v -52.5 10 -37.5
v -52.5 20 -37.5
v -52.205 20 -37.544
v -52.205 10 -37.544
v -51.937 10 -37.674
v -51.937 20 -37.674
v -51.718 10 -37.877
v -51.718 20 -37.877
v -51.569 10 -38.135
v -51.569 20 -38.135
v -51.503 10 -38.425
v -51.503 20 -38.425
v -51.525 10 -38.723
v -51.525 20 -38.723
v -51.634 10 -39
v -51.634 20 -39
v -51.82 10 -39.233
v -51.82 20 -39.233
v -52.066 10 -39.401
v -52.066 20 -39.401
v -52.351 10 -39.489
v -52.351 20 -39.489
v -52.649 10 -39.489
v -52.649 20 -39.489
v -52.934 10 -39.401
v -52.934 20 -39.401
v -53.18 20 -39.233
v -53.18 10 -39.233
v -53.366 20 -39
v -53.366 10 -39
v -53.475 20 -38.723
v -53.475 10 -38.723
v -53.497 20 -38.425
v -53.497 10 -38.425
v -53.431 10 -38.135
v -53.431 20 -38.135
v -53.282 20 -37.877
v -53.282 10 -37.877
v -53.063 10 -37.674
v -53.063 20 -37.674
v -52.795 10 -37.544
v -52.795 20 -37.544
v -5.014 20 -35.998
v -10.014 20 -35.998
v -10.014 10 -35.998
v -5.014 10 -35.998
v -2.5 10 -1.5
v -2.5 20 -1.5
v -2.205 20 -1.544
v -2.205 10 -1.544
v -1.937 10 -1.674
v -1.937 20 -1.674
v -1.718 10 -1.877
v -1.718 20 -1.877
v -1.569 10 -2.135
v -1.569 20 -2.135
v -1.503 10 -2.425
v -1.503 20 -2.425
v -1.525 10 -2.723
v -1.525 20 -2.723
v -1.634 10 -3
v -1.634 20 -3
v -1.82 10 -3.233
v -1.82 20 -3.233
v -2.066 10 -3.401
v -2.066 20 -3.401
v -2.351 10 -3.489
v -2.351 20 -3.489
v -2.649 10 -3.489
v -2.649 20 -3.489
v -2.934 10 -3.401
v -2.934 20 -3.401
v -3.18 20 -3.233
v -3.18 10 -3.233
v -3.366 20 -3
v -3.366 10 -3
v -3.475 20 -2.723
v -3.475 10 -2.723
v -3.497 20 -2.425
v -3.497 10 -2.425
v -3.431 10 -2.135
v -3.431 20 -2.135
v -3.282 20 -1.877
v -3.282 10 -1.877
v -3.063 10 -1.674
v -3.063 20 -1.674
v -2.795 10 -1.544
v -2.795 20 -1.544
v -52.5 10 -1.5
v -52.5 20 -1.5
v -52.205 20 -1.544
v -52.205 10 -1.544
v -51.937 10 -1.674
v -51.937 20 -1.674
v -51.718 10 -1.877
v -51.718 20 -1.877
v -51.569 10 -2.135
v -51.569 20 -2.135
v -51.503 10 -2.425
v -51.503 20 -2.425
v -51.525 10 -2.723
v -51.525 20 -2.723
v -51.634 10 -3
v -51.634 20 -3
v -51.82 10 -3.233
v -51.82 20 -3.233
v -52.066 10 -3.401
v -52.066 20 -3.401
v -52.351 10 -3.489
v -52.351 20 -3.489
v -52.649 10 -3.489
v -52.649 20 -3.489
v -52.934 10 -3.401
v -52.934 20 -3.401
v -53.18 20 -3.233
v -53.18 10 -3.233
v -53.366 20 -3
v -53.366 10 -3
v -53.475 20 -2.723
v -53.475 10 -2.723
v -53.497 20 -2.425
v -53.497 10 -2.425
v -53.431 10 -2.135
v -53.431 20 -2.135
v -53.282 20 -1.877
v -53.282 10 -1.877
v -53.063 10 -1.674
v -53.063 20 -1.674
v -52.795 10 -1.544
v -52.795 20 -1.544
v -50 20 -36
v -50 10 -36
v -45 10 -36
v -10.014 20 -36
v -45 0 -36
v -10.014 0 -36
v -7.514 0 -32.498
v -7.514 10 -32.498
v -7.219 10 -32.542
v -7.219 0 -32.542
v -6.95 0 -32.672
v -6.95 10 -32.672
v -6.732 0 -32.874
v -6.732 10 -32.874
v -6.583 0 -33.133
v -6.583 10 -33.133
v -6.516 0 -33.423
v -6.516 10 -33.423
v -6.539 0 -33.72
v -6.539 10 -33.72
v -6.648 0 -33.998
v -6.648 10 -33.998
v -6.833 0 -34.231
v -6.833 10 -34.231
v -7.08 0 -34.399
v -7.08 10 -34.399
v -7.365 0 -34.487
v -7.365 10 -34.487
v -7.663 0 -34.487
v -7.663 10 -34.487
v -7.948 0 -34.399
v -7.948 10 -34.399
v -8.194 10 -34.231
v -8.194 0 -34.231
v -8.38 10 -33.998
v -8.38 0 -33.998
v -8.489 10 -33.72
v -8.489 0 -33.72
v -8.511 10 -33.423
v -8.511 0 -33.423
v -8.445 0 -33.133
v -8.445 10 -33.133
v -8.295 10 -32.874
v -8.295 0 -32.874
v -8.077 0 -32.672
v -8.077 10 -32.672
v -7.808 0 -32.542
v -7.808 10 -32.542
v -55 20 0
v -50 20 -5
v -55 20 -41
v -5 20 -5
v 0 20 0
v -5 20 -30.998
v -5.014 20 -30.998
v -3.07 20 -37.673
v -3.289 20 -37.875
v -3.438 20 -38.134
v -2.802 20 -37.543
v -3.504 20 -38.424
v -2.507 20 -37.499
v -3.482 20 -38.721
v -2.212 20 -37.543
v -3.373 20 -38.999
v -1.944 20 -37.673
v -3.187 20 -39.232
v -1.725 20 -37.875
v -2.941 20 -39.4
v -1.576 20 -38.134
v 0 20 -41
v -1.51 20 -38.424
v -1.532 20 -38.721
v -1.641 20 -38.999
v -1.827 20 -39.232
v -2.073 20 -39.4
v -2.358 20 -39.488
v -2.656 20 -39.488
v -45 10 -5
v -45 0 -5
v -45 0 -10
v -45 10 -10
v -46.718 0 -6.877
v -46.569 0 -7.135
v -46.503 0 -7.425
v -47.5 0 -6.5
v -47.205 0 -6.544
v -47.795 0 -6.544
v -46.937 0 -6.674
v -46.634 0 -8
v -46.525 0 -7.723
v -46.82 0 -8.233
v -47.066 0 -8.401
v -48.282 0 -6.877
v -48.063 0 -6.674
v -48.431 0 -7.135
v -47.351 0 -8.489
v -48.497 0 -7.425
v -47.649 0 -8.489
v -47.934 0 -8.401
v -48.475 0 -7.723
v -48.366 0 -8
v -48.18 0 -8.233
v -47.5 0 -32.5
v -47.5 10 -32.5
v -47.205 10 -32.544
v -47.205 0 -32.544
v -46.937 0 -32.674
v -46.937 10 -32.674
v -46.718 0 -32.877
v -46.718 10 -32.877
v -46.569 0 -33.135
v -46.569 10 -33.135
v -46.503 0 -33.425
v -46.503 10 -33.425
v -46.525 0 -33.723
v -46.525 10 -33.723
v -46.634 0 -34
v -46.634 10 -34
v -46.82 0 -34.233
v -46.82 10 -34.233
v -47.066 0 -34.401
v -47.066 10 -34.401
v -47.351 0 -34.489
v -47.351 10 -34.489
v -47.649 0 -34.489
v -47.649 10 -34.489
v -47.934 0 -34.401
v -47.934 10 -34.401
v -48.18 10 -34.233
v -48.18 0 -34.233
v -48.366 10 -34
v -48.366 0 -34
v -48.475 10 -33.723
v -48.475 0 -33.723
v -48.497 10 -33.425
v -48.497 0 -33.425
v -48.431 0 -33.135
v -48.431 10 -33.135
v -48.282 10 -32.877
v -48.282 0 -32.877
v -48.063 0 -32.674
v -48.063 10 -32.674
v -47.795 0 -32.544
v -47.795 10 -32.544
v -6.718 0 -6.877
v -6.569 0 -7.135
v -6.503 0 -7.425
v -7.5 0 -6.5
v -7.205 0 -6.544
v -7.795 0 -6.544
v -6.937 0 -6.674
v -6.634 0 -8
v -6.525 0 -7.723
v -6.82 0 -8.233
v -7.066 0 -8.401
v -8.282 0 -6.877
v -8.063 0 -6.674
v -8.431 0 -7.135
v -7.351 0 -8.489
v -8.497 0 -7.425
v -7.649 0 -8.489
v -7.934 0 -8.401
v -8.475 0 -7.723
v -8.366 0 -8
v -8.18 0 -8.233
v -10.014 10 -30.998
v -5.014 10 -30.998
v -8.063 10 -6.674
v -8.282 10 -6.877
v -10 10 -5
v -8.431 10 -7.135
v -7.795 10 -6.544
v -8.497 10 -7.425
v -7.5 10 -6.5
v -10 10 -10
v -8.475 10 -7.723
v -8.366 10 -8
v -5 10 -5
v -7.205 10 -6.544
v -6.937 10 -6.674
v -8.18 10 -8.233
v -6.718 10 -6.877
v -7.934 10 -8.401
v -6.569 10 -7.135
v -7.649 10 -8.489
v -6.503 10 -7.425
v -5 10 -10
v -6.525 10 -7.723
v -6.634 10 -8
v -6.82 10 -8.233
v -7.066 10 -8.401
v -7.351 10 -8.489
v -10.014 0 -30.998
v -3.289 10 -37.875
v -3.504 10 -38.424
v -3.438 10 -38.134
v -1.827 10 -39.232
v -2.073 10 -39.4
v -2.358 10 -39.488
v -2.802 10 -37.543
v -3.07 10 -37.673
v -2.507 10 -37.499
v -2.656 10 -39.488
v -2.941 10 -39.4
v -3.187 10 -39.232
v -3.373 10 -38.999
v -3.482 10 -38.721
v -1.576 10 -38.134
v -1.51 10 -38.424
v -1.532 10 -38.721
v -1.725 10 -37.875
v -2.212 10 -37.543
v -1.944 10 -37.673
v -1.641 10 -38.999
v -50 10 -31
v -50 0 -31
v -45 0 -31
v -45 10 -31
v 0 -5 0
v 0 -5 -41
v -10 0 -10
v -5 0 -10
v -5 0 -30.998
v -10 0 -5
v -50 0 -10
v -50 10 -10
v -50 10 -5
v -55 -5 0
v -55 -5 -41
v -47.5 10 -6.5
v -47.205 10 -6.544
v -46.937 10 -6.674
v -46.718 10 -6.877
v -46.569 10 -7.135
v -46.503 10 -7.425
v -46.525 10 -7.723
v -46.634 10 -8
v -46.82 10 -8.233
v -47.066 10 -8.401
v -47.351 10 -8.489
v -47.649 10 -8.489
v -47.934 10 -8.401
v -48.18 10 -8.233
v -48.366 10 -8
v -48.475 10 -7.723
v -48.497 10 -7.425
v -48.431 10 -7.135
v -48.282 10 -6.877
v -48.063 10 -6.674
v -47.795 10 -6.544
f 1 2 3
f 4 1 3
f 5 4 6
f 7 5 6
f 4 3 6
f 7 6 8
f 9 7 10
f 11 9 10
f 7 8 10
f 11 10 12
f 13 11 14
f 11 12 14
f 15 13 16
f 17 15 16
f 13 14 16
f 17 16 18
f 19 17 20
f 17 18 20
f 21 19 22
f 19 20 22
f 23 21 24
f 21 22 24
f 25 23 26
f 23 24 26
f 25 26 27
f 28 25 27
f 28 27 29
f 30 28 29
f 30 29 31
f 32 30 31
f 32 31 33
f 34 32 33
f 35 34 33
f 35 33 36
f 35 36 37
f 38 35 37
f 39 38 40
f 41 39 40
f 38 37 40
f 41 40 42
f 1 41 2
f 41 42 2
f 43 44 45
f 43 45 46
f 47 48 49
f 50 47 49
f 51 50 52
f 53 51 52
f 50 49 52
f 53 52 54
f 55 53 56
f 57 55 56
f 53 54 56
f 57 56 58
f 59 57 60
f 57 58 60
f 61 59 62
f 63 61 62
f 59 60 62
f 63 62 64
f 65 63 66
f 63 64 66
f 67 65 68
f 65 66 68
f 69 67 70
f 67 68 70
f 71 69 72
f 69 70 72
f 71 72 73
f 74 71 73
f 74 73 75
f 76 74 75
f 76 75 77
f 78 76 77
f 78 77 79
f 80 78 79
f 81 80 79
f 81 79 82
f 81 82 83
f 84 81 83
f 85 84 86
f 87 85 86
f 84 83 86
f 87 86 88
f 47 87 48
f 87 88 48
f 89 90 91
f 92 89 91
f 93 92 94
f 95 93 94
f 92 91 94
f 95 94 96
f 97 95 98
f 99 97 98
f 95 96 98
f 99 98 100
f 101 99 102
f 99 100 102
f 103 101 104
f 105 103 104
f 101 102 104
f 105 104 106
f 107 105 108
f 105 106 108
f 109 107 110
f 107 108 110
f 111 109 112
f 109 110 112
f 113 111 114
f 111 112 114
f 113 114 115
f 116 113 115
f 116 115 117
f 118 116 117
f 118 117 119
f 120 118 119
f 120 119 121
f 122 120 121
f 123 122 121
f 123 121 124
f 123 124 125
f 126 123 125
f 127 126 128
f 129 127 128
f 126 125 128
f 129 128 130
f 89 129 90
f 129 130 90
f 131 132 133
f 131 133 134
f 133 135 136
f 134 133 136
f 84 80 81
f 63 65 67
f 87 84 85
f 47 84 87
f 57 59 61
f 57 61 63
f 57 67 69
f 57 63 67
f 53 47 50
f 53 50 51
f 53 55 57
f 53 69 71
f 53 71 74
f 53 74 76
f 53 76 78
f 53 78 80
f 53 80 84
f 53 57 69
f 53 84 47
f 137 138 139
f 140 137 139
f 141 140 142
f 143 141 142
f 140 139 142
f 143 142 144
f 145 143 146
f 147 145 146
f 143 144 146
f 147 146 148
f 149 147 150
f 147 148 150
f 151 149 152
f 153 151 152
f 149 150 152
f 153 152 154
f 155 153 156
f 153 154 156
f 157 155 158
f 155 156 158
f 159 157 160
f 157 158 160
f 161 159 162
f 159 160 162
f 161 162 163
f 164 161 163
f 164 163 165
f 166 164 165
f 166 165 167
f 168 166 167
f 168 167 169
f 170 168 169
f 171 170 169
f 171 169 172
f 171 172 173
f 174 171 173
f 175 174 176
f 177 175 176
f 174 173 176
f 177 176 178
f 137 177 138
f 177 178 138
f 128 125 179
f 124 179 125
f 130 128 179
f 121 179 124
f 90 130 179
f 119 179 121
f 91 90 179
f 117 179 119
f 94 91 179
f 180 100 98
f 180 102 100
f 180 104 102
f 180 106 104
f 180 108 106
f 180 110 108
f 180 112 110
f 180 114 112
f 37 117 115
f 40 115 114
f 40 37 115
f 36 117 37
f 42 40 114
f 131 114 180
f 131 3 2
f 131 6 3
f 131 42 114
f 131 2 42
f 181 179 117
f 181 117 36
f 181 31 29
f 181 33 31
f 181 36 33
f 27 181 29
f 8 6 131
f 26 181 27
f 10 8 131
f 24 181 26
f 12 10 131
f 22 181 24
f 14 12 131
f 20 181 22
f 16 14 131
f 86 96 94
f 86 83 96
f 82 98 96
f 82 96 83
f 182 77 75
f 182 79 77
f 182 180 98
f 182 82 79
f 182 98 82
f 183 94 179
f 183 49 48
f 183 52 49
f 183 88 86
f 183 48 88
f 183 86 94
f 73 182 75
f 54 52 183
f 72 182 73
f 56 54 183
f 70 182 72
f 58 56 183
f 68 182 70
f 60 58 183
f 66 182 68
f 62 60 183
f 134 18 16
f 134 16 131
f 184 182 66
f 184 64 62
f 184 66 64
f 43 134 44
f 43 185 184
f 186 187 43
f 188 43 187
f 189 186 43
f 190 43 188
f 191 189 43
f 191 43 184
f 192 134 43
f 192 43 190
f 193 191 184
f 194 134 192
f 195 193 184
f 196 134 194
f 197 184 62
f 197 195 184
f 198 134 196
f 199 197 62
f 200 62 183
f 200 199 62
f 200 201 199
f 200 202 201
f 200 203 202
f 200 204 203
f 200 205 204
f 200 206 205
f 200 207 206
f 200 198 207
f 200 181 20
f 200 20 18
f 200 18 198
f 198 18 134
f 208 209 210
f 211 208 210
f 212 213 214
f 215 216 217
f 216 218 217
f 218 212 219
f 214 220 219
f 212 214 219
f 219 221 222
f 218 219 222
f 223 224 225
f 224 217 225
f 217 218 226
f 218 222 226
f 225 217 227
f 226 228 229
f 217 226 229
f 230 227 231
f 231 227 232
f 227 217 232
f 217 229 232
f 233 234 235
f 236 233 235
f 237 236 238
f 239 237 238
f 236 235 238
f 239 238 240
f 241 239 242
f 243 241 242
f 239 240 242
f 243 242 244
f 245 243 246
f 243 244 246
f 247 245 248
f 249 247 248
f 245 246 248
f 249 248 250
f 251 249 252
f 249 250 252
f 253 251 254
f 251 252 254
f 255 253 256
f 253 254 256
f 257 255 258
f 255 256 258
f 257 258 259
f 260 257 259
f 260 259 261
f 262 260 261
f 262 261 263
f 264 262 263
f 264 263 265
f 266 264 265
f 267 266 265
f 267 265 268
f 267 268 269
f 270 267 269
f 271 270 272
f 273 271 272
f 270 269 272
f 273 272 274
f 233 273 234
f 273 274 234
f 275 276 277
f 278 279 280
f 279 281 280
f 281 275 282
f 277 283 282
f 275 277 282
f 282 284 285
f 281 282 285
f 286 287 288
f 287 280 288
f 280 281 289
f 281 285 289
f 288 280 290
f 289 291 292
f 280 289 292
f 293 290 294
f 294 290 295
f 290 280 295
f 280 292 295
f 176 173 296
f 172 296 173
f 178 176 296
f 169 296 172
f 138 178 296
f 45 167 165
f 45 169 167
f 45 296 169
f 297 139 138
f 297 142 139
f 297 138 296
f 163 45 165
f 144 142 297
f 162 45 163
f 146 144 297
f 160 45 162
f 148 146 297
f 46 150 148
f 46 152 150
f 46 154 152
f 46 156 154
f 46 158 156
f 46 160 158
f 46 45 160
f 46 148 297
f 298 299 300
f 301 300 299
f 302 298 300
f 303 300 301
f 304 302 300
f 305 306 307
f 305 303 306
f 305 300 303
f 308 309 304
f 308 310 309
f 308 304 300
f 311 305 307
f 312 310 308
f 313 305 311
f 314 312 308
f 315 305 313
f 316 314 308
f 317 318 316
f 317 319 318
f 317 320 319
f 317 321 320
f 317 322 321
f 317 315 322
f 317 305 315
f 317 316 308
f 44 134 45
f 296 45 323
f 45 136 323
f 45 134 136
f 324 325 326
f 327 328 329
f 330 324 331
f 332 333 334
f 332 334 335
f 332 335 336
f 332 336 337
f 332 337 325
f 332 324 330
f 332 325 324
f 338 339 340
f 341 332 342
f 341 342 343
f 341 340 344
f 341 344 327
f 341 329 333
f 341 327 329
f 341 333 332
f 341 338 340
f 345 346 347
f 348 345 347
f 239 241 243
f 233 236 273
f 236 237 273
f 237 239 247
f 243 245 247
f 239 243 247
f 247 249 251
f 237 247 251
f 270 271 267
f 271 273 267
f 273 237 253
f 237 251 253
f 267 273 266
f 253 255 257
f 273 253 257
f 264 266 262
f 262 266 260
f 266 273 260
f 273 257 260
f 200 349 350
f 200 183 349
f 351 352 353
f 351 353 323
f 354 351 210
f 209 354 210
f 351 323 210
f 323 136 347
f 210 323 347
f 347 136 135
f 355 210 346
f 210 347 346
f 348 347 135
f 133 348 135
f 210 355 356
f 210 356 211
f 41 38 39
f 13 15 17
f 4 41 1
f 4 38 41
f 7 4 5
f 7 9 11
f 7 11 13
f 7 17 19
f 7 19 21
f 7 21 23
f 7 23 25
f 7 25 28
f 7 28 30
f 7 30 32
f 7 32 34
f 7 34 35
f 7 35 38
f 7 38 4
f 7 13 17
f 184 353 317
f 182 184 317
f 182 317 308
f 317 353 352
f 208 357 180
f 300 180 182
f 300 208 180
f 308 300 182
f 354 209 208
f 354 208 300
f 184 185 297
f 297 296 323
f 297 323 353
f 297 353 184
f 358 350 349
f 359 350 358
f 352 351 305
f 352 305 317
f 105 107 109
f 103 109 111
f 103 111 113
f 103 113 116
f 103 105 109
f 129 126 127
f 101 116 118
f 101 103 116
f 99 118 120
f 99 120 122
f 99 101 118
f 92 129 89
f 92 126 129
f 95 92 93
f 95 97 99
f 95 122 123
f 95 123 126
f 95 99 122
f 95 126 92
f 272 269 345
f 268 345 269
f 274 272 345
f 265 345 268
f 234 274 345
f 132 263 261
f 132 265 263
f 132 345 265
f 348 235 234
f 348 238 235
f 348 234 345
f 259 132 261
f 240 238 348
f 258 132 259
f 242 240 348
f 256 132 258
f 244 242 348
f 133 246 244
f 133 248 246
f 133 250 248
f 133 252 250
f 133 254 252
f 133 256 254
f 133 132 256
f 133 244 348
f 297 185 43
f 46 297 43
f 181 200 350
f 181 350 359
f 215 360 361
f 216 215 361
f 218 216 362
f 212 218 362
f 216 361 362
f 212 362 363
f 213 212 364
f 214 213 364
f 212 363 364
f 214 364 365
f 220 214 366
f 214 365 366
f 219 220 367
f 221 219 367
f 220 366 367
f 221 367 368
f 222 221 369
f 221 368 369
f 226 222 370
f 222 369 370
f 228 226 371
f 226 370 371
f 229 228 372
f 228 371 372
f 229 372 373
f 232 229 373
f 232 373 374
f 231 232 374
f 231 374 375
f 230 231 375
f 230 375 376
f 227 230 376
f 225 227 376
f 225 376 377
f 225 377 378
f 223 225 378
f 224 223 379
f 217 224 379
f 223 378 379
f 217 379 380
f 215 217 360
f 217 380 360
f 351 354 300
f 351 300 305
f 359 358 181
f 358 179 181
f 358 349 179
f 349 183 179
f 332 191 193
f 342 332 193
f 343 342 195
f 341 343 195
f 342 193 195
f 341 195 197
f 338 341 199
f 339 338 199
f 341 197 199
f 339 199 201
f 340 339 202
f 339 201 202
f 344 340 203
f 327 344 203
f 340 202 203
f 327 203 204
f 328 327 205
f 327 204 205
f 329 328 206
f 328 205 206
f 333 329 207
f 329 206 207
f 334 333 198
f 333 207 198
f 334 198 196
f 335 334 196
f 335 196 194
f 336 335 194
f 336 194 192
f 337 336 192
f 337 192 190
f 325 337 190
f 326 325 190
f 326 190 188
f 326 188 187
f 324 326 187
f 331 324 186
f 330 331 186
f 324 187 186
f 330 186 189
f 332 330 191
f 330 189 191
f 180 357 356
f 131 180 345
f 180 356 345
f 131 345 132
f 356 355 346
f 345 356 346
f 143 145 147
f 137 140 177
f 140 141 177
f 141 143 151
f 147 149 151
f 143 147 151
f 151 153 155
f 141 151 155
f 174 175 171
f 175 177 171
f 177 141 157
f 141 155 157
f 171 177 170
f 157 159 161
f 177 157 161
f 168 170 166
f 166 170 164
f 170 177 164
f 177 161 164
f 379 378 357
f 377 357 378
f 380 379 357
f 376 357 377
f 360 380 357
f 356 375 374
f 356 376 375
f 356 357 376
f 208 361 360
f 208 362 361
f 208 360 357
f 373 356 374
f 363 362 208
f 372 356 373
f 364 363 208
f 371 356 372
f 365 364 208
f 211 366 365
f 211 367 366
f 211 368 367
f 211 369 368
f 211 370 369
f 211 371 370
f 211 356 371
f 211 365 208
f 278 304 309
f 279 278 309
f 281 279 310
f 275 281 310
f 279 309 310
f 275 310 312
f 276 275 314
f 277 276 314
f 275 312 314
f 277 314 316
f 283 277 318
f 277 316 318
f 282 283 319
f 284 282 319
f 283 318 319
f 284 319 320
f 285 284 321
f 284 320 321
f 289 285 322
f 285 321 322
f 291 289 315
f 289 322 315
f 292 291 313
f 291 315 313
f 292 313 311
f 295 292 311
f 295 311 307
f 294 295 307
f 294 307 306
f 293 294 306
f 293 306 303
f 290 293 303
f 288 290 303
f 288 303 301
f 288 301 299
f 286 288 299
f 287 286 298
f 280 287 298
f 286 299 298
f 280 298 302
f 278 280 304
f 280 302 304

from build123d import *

# Parameters (mm, degrees)
SKETCH2_W            = 55
SKETCH2_H            = 5
SKETCH2_W_2          = 5
BOSS_EXTRUDE3_DEPTH  = 20
SKETCH3_W            = 5
SKETCH3_H            = 5
CUT_EXTRUDE1_DEPTH   = 10
SKETCH5_W            = 5
SKETCH5_H            = 5
CUT_EXTRUDE2_DEPTH   = 10
SKETCH6_W            = 5
SKETCH6_H            = 5
CUT_EXTRUDE3_DEPTH   = 10
SKETCH7_R            = 1
CUT_EXTRUDE5_DEPTH   = 10
SKETCH8_R            = 1
CUT_EXTRUDE6_DEPTH   = 10
SKETCH9_R            = 1
CUT_EXTRUDE7_DEPTH   = 10
SKETCH10_R           = 1
CUT_EXTRUDE8_DEPTH   = 10
SKETCH11_W           = 55
SKETCH11_H           = 41
BOSS_EXTRUDE10_DEPTH = 5
SKETCH12_R           = 1
CUT_EXTRUDE9_DEPTH   = 10
SKETCH13_R           = 1
CUT_EXTRUDE10_DEPTH  = 10
SKETCH14_R           = 1
CUT_EXTRUDE11_DEPTH  = 10
SKETCH15_R           = 1
CUT_EXTRUDE12_DEPTH  = 10


with BuildPart() as part:
    # Sketch2 → Boss-Extrude3 (new body)
    with BuildSketch(Plane(origin=(0, 0, 0), x_dir=(1, 0, 0), z_dir=(0, 1, 0))):
        with Locations((-27.5, 2.5)):
            Rectangle(SKETCH2_W, SKETCH2_H)
        Polygon((-5, 5), (0, 5), (0, 41), (-5, 41), (-5, 36), (-5, 30.997910325), (-5, 10), align=None)
        Polygon((-5, 36), (-5, 41), (-50, 41), (-50, 36), (-45, 36), (-10.013652048, 36), (-9.330274009, 36), align=None)
        Polygon((-55, 41), (-55, 5), (-50, 5), (-50, 10), (-50, 31), (-50, 36), (-50, 41), align=None)
        with Locations((-47.5, 33.5)):
            Rectangle(SKETCH2_W_2, SKETCH2_H)
        with Locations((-47.5, 7.5)):
            Rectangle(SKETCH2_W_2, SKETCH2_H)
        Polygon((-10.013652048, 30.997910325), (-5, 30.997910325), (-5, 36), (-9.330274009, 36), (-10.013652048, 36), align=None)
        with Locations((-7.5, 7.5)):
            Rectangle(SKETCH2_W_2, SKETCH2_H)
    extrude(amount=BOSS_EXTRUDE3_DEPTH)

    # Sketch3 → Cut-Extrude1 (cut)
    with BuildSketch(Plane(origin=(0, 20, 0), x_dir=(1, 0, 0), z_dir=(0, 1, 0))):
        with Locations((-7.513652048, 33.497910325)):
            Rectangle(SKETCH3_W, SKETCH3_H)
    extrude(amount=-CUT_EXTRUDE1_DEPTH, mode=Mode.SUBTRACT)

    # Sketch5 → Cut-Extrude2 (cut)
    with BuildSketch(Plane(origin=(0, 20, 0), x_dir=(1, 0, 0), z_dir=(0, 1, 0))):
        with Locations((-47.5, 33.5)):
            Rectangle(SKETCH5_W, SKETCH5_H)
    extrude(amount=-CUT_EXTRUDE2_DEPTH, mode=Mode.SUBTRACT)

    # Sketch6 → Cut-Extrude3 (cut)
    with BuildSketch(Plane(origin=(0, 20, 0), x_dir=(1, 0, 0), z_dir=(0, 1, 0))):
        with Locations((-47.5, 7.5)):
            Rectangle(SKETCH6_W, SKETCH6_H)
        with Locations((-7.5, 7.5)):
            Rectangle(SKETCH6_W, SKETCH6_H)
    extrude(amount=-CUT_EXTRUDE3_DEPTH, mode=Mode.SUBTRACT)

    # Sketch7 → Cut-Extrude5 (cut)
    with BuildSketch(Plane(origin=(0, 10, 0), x_dir=(1, 0, 0), z_dir=(0, 1, 0))):
        with Locations(Location((-47.5, 33.5, 0), (0, 0, 270))):
            Circle(SKETCH7_R)
    extrude(amount=-CUT_EXTRUDE5_DEPTH, mode=Mode.SUBTRACT)

    # Sketch8 → Cut-Extrude6 (cut)
    with BuildSketch(Plane(origin=(0, 10, 0), x_dir=(1, 0, 0), z_dir=(0, 1, 0))):
        with Locations(Location((-7.513652048, 33.497910325, 0), (0, 0, 270))):
            Circle(SKETCH8_R)
    extrude(amount=-CUT_EXTRUDE6_DEPTH, mode=Mode.SUBTRACT)

    # Sketch9 → Cut-Extrude7 (cut)
    with BuildSketch(Plane(origin=(0, 10, 0), x_dir=(1, 0, 0), z_dir=(0, 1, 0))):
        with Locations(Location((-47.5, 7.5, 0), (0, 0, 270))):
            Circle(SKETCH9_R)
    extrude(amount=-CUT_EXTRUDE7_DEPTH, mode=Mode.SUBTRACT)

    # Sketch10 → Cut-Extrude8 (cut)
    with BuildSketch(Plane(origin=(0, 10, 0), x_dir=(1, 0, 0), z_dir=(0, 1, 0))):
        with Locations(Location((-7.5, 7.5, 0), (0, 0, 270))):
            Circle(SKETCH10_R)
    extrude(amount=-CUT_EXTRUDE8_DEPTH, mode=Mode.SUBTRACT)

    # Sketch11 → Boss-Extrude10 (add)
    with BuildSketch(Plane(origin=(0, 0, 0), x_dir=(-1, 0, 0), z_dir=(0, -1, 0))):
        with Locations((27.5, 20.5)):
            Rectangle(SKETCH11_W, SKETCH11_H)
    extrude(amount=BOSS_EXTRUDE10_DEPTH)

    # Sketch12 → Cut-Extrude9 (cut)
    with BuildSketch(Plane(origin=(0, 20, 0), x_dir=(1, 0, 0), z_dir=(0, 1, 0))):
        with Locations(Location((-52.5, 38.5, 0), (0, 0, 270))):
            Circle(SKETCH12_R)
    extrude(amount=-CUT_EXTRUDE9_DEPTH, mode=Mode.SUBTRACT)

    # Sketch13 → Cut-Extrude10 (cut)
    with BuildSketch(Plane(origin=(0, 20, 0), x_dir=(1, 0, 0), z_dir=(0, 1, 0))):
        with Locations(Location((-2.506826024, 38.498955163, 0), (0, 0, 270))):
            Circle(SKETCH13_R)
    extrude(amount=-CUT_EXTRUDE10_DEPTH, mode=Mode.SUBTRACT)

    # Sketch14 → Cut-Extrude11 (cut)
    with BuildSketch(Plane(origin=(0, 20, 0), x_dir=(1, 0, 0), z_dir=(0, 1, 0))):
        with Locations(Location((-52.5, 2.5, 0), (0, 0, 270))):
            Circle(SKETCH14_R)
    extrude(amount=-CUT_EXTRUDE11_DEPTH, mode=Mode.SUBTRACT)

    # Sketch15 → Cut-Extrude12 (cut)
    with BuildSketch(Plane(origin=(0, 20, 0), x_dir=(1, 0, 0), z_dir=(0, 1, 0))):
        with Locations(Location((-2.5, 2.5, 0), (0, 0, 270))):
            Circle(SKETCH15_R)
    extrude(amount=-CUT_EXTRUDE12_DEPTH, mode=Mode.SUBTRACT)


solid = part.part
